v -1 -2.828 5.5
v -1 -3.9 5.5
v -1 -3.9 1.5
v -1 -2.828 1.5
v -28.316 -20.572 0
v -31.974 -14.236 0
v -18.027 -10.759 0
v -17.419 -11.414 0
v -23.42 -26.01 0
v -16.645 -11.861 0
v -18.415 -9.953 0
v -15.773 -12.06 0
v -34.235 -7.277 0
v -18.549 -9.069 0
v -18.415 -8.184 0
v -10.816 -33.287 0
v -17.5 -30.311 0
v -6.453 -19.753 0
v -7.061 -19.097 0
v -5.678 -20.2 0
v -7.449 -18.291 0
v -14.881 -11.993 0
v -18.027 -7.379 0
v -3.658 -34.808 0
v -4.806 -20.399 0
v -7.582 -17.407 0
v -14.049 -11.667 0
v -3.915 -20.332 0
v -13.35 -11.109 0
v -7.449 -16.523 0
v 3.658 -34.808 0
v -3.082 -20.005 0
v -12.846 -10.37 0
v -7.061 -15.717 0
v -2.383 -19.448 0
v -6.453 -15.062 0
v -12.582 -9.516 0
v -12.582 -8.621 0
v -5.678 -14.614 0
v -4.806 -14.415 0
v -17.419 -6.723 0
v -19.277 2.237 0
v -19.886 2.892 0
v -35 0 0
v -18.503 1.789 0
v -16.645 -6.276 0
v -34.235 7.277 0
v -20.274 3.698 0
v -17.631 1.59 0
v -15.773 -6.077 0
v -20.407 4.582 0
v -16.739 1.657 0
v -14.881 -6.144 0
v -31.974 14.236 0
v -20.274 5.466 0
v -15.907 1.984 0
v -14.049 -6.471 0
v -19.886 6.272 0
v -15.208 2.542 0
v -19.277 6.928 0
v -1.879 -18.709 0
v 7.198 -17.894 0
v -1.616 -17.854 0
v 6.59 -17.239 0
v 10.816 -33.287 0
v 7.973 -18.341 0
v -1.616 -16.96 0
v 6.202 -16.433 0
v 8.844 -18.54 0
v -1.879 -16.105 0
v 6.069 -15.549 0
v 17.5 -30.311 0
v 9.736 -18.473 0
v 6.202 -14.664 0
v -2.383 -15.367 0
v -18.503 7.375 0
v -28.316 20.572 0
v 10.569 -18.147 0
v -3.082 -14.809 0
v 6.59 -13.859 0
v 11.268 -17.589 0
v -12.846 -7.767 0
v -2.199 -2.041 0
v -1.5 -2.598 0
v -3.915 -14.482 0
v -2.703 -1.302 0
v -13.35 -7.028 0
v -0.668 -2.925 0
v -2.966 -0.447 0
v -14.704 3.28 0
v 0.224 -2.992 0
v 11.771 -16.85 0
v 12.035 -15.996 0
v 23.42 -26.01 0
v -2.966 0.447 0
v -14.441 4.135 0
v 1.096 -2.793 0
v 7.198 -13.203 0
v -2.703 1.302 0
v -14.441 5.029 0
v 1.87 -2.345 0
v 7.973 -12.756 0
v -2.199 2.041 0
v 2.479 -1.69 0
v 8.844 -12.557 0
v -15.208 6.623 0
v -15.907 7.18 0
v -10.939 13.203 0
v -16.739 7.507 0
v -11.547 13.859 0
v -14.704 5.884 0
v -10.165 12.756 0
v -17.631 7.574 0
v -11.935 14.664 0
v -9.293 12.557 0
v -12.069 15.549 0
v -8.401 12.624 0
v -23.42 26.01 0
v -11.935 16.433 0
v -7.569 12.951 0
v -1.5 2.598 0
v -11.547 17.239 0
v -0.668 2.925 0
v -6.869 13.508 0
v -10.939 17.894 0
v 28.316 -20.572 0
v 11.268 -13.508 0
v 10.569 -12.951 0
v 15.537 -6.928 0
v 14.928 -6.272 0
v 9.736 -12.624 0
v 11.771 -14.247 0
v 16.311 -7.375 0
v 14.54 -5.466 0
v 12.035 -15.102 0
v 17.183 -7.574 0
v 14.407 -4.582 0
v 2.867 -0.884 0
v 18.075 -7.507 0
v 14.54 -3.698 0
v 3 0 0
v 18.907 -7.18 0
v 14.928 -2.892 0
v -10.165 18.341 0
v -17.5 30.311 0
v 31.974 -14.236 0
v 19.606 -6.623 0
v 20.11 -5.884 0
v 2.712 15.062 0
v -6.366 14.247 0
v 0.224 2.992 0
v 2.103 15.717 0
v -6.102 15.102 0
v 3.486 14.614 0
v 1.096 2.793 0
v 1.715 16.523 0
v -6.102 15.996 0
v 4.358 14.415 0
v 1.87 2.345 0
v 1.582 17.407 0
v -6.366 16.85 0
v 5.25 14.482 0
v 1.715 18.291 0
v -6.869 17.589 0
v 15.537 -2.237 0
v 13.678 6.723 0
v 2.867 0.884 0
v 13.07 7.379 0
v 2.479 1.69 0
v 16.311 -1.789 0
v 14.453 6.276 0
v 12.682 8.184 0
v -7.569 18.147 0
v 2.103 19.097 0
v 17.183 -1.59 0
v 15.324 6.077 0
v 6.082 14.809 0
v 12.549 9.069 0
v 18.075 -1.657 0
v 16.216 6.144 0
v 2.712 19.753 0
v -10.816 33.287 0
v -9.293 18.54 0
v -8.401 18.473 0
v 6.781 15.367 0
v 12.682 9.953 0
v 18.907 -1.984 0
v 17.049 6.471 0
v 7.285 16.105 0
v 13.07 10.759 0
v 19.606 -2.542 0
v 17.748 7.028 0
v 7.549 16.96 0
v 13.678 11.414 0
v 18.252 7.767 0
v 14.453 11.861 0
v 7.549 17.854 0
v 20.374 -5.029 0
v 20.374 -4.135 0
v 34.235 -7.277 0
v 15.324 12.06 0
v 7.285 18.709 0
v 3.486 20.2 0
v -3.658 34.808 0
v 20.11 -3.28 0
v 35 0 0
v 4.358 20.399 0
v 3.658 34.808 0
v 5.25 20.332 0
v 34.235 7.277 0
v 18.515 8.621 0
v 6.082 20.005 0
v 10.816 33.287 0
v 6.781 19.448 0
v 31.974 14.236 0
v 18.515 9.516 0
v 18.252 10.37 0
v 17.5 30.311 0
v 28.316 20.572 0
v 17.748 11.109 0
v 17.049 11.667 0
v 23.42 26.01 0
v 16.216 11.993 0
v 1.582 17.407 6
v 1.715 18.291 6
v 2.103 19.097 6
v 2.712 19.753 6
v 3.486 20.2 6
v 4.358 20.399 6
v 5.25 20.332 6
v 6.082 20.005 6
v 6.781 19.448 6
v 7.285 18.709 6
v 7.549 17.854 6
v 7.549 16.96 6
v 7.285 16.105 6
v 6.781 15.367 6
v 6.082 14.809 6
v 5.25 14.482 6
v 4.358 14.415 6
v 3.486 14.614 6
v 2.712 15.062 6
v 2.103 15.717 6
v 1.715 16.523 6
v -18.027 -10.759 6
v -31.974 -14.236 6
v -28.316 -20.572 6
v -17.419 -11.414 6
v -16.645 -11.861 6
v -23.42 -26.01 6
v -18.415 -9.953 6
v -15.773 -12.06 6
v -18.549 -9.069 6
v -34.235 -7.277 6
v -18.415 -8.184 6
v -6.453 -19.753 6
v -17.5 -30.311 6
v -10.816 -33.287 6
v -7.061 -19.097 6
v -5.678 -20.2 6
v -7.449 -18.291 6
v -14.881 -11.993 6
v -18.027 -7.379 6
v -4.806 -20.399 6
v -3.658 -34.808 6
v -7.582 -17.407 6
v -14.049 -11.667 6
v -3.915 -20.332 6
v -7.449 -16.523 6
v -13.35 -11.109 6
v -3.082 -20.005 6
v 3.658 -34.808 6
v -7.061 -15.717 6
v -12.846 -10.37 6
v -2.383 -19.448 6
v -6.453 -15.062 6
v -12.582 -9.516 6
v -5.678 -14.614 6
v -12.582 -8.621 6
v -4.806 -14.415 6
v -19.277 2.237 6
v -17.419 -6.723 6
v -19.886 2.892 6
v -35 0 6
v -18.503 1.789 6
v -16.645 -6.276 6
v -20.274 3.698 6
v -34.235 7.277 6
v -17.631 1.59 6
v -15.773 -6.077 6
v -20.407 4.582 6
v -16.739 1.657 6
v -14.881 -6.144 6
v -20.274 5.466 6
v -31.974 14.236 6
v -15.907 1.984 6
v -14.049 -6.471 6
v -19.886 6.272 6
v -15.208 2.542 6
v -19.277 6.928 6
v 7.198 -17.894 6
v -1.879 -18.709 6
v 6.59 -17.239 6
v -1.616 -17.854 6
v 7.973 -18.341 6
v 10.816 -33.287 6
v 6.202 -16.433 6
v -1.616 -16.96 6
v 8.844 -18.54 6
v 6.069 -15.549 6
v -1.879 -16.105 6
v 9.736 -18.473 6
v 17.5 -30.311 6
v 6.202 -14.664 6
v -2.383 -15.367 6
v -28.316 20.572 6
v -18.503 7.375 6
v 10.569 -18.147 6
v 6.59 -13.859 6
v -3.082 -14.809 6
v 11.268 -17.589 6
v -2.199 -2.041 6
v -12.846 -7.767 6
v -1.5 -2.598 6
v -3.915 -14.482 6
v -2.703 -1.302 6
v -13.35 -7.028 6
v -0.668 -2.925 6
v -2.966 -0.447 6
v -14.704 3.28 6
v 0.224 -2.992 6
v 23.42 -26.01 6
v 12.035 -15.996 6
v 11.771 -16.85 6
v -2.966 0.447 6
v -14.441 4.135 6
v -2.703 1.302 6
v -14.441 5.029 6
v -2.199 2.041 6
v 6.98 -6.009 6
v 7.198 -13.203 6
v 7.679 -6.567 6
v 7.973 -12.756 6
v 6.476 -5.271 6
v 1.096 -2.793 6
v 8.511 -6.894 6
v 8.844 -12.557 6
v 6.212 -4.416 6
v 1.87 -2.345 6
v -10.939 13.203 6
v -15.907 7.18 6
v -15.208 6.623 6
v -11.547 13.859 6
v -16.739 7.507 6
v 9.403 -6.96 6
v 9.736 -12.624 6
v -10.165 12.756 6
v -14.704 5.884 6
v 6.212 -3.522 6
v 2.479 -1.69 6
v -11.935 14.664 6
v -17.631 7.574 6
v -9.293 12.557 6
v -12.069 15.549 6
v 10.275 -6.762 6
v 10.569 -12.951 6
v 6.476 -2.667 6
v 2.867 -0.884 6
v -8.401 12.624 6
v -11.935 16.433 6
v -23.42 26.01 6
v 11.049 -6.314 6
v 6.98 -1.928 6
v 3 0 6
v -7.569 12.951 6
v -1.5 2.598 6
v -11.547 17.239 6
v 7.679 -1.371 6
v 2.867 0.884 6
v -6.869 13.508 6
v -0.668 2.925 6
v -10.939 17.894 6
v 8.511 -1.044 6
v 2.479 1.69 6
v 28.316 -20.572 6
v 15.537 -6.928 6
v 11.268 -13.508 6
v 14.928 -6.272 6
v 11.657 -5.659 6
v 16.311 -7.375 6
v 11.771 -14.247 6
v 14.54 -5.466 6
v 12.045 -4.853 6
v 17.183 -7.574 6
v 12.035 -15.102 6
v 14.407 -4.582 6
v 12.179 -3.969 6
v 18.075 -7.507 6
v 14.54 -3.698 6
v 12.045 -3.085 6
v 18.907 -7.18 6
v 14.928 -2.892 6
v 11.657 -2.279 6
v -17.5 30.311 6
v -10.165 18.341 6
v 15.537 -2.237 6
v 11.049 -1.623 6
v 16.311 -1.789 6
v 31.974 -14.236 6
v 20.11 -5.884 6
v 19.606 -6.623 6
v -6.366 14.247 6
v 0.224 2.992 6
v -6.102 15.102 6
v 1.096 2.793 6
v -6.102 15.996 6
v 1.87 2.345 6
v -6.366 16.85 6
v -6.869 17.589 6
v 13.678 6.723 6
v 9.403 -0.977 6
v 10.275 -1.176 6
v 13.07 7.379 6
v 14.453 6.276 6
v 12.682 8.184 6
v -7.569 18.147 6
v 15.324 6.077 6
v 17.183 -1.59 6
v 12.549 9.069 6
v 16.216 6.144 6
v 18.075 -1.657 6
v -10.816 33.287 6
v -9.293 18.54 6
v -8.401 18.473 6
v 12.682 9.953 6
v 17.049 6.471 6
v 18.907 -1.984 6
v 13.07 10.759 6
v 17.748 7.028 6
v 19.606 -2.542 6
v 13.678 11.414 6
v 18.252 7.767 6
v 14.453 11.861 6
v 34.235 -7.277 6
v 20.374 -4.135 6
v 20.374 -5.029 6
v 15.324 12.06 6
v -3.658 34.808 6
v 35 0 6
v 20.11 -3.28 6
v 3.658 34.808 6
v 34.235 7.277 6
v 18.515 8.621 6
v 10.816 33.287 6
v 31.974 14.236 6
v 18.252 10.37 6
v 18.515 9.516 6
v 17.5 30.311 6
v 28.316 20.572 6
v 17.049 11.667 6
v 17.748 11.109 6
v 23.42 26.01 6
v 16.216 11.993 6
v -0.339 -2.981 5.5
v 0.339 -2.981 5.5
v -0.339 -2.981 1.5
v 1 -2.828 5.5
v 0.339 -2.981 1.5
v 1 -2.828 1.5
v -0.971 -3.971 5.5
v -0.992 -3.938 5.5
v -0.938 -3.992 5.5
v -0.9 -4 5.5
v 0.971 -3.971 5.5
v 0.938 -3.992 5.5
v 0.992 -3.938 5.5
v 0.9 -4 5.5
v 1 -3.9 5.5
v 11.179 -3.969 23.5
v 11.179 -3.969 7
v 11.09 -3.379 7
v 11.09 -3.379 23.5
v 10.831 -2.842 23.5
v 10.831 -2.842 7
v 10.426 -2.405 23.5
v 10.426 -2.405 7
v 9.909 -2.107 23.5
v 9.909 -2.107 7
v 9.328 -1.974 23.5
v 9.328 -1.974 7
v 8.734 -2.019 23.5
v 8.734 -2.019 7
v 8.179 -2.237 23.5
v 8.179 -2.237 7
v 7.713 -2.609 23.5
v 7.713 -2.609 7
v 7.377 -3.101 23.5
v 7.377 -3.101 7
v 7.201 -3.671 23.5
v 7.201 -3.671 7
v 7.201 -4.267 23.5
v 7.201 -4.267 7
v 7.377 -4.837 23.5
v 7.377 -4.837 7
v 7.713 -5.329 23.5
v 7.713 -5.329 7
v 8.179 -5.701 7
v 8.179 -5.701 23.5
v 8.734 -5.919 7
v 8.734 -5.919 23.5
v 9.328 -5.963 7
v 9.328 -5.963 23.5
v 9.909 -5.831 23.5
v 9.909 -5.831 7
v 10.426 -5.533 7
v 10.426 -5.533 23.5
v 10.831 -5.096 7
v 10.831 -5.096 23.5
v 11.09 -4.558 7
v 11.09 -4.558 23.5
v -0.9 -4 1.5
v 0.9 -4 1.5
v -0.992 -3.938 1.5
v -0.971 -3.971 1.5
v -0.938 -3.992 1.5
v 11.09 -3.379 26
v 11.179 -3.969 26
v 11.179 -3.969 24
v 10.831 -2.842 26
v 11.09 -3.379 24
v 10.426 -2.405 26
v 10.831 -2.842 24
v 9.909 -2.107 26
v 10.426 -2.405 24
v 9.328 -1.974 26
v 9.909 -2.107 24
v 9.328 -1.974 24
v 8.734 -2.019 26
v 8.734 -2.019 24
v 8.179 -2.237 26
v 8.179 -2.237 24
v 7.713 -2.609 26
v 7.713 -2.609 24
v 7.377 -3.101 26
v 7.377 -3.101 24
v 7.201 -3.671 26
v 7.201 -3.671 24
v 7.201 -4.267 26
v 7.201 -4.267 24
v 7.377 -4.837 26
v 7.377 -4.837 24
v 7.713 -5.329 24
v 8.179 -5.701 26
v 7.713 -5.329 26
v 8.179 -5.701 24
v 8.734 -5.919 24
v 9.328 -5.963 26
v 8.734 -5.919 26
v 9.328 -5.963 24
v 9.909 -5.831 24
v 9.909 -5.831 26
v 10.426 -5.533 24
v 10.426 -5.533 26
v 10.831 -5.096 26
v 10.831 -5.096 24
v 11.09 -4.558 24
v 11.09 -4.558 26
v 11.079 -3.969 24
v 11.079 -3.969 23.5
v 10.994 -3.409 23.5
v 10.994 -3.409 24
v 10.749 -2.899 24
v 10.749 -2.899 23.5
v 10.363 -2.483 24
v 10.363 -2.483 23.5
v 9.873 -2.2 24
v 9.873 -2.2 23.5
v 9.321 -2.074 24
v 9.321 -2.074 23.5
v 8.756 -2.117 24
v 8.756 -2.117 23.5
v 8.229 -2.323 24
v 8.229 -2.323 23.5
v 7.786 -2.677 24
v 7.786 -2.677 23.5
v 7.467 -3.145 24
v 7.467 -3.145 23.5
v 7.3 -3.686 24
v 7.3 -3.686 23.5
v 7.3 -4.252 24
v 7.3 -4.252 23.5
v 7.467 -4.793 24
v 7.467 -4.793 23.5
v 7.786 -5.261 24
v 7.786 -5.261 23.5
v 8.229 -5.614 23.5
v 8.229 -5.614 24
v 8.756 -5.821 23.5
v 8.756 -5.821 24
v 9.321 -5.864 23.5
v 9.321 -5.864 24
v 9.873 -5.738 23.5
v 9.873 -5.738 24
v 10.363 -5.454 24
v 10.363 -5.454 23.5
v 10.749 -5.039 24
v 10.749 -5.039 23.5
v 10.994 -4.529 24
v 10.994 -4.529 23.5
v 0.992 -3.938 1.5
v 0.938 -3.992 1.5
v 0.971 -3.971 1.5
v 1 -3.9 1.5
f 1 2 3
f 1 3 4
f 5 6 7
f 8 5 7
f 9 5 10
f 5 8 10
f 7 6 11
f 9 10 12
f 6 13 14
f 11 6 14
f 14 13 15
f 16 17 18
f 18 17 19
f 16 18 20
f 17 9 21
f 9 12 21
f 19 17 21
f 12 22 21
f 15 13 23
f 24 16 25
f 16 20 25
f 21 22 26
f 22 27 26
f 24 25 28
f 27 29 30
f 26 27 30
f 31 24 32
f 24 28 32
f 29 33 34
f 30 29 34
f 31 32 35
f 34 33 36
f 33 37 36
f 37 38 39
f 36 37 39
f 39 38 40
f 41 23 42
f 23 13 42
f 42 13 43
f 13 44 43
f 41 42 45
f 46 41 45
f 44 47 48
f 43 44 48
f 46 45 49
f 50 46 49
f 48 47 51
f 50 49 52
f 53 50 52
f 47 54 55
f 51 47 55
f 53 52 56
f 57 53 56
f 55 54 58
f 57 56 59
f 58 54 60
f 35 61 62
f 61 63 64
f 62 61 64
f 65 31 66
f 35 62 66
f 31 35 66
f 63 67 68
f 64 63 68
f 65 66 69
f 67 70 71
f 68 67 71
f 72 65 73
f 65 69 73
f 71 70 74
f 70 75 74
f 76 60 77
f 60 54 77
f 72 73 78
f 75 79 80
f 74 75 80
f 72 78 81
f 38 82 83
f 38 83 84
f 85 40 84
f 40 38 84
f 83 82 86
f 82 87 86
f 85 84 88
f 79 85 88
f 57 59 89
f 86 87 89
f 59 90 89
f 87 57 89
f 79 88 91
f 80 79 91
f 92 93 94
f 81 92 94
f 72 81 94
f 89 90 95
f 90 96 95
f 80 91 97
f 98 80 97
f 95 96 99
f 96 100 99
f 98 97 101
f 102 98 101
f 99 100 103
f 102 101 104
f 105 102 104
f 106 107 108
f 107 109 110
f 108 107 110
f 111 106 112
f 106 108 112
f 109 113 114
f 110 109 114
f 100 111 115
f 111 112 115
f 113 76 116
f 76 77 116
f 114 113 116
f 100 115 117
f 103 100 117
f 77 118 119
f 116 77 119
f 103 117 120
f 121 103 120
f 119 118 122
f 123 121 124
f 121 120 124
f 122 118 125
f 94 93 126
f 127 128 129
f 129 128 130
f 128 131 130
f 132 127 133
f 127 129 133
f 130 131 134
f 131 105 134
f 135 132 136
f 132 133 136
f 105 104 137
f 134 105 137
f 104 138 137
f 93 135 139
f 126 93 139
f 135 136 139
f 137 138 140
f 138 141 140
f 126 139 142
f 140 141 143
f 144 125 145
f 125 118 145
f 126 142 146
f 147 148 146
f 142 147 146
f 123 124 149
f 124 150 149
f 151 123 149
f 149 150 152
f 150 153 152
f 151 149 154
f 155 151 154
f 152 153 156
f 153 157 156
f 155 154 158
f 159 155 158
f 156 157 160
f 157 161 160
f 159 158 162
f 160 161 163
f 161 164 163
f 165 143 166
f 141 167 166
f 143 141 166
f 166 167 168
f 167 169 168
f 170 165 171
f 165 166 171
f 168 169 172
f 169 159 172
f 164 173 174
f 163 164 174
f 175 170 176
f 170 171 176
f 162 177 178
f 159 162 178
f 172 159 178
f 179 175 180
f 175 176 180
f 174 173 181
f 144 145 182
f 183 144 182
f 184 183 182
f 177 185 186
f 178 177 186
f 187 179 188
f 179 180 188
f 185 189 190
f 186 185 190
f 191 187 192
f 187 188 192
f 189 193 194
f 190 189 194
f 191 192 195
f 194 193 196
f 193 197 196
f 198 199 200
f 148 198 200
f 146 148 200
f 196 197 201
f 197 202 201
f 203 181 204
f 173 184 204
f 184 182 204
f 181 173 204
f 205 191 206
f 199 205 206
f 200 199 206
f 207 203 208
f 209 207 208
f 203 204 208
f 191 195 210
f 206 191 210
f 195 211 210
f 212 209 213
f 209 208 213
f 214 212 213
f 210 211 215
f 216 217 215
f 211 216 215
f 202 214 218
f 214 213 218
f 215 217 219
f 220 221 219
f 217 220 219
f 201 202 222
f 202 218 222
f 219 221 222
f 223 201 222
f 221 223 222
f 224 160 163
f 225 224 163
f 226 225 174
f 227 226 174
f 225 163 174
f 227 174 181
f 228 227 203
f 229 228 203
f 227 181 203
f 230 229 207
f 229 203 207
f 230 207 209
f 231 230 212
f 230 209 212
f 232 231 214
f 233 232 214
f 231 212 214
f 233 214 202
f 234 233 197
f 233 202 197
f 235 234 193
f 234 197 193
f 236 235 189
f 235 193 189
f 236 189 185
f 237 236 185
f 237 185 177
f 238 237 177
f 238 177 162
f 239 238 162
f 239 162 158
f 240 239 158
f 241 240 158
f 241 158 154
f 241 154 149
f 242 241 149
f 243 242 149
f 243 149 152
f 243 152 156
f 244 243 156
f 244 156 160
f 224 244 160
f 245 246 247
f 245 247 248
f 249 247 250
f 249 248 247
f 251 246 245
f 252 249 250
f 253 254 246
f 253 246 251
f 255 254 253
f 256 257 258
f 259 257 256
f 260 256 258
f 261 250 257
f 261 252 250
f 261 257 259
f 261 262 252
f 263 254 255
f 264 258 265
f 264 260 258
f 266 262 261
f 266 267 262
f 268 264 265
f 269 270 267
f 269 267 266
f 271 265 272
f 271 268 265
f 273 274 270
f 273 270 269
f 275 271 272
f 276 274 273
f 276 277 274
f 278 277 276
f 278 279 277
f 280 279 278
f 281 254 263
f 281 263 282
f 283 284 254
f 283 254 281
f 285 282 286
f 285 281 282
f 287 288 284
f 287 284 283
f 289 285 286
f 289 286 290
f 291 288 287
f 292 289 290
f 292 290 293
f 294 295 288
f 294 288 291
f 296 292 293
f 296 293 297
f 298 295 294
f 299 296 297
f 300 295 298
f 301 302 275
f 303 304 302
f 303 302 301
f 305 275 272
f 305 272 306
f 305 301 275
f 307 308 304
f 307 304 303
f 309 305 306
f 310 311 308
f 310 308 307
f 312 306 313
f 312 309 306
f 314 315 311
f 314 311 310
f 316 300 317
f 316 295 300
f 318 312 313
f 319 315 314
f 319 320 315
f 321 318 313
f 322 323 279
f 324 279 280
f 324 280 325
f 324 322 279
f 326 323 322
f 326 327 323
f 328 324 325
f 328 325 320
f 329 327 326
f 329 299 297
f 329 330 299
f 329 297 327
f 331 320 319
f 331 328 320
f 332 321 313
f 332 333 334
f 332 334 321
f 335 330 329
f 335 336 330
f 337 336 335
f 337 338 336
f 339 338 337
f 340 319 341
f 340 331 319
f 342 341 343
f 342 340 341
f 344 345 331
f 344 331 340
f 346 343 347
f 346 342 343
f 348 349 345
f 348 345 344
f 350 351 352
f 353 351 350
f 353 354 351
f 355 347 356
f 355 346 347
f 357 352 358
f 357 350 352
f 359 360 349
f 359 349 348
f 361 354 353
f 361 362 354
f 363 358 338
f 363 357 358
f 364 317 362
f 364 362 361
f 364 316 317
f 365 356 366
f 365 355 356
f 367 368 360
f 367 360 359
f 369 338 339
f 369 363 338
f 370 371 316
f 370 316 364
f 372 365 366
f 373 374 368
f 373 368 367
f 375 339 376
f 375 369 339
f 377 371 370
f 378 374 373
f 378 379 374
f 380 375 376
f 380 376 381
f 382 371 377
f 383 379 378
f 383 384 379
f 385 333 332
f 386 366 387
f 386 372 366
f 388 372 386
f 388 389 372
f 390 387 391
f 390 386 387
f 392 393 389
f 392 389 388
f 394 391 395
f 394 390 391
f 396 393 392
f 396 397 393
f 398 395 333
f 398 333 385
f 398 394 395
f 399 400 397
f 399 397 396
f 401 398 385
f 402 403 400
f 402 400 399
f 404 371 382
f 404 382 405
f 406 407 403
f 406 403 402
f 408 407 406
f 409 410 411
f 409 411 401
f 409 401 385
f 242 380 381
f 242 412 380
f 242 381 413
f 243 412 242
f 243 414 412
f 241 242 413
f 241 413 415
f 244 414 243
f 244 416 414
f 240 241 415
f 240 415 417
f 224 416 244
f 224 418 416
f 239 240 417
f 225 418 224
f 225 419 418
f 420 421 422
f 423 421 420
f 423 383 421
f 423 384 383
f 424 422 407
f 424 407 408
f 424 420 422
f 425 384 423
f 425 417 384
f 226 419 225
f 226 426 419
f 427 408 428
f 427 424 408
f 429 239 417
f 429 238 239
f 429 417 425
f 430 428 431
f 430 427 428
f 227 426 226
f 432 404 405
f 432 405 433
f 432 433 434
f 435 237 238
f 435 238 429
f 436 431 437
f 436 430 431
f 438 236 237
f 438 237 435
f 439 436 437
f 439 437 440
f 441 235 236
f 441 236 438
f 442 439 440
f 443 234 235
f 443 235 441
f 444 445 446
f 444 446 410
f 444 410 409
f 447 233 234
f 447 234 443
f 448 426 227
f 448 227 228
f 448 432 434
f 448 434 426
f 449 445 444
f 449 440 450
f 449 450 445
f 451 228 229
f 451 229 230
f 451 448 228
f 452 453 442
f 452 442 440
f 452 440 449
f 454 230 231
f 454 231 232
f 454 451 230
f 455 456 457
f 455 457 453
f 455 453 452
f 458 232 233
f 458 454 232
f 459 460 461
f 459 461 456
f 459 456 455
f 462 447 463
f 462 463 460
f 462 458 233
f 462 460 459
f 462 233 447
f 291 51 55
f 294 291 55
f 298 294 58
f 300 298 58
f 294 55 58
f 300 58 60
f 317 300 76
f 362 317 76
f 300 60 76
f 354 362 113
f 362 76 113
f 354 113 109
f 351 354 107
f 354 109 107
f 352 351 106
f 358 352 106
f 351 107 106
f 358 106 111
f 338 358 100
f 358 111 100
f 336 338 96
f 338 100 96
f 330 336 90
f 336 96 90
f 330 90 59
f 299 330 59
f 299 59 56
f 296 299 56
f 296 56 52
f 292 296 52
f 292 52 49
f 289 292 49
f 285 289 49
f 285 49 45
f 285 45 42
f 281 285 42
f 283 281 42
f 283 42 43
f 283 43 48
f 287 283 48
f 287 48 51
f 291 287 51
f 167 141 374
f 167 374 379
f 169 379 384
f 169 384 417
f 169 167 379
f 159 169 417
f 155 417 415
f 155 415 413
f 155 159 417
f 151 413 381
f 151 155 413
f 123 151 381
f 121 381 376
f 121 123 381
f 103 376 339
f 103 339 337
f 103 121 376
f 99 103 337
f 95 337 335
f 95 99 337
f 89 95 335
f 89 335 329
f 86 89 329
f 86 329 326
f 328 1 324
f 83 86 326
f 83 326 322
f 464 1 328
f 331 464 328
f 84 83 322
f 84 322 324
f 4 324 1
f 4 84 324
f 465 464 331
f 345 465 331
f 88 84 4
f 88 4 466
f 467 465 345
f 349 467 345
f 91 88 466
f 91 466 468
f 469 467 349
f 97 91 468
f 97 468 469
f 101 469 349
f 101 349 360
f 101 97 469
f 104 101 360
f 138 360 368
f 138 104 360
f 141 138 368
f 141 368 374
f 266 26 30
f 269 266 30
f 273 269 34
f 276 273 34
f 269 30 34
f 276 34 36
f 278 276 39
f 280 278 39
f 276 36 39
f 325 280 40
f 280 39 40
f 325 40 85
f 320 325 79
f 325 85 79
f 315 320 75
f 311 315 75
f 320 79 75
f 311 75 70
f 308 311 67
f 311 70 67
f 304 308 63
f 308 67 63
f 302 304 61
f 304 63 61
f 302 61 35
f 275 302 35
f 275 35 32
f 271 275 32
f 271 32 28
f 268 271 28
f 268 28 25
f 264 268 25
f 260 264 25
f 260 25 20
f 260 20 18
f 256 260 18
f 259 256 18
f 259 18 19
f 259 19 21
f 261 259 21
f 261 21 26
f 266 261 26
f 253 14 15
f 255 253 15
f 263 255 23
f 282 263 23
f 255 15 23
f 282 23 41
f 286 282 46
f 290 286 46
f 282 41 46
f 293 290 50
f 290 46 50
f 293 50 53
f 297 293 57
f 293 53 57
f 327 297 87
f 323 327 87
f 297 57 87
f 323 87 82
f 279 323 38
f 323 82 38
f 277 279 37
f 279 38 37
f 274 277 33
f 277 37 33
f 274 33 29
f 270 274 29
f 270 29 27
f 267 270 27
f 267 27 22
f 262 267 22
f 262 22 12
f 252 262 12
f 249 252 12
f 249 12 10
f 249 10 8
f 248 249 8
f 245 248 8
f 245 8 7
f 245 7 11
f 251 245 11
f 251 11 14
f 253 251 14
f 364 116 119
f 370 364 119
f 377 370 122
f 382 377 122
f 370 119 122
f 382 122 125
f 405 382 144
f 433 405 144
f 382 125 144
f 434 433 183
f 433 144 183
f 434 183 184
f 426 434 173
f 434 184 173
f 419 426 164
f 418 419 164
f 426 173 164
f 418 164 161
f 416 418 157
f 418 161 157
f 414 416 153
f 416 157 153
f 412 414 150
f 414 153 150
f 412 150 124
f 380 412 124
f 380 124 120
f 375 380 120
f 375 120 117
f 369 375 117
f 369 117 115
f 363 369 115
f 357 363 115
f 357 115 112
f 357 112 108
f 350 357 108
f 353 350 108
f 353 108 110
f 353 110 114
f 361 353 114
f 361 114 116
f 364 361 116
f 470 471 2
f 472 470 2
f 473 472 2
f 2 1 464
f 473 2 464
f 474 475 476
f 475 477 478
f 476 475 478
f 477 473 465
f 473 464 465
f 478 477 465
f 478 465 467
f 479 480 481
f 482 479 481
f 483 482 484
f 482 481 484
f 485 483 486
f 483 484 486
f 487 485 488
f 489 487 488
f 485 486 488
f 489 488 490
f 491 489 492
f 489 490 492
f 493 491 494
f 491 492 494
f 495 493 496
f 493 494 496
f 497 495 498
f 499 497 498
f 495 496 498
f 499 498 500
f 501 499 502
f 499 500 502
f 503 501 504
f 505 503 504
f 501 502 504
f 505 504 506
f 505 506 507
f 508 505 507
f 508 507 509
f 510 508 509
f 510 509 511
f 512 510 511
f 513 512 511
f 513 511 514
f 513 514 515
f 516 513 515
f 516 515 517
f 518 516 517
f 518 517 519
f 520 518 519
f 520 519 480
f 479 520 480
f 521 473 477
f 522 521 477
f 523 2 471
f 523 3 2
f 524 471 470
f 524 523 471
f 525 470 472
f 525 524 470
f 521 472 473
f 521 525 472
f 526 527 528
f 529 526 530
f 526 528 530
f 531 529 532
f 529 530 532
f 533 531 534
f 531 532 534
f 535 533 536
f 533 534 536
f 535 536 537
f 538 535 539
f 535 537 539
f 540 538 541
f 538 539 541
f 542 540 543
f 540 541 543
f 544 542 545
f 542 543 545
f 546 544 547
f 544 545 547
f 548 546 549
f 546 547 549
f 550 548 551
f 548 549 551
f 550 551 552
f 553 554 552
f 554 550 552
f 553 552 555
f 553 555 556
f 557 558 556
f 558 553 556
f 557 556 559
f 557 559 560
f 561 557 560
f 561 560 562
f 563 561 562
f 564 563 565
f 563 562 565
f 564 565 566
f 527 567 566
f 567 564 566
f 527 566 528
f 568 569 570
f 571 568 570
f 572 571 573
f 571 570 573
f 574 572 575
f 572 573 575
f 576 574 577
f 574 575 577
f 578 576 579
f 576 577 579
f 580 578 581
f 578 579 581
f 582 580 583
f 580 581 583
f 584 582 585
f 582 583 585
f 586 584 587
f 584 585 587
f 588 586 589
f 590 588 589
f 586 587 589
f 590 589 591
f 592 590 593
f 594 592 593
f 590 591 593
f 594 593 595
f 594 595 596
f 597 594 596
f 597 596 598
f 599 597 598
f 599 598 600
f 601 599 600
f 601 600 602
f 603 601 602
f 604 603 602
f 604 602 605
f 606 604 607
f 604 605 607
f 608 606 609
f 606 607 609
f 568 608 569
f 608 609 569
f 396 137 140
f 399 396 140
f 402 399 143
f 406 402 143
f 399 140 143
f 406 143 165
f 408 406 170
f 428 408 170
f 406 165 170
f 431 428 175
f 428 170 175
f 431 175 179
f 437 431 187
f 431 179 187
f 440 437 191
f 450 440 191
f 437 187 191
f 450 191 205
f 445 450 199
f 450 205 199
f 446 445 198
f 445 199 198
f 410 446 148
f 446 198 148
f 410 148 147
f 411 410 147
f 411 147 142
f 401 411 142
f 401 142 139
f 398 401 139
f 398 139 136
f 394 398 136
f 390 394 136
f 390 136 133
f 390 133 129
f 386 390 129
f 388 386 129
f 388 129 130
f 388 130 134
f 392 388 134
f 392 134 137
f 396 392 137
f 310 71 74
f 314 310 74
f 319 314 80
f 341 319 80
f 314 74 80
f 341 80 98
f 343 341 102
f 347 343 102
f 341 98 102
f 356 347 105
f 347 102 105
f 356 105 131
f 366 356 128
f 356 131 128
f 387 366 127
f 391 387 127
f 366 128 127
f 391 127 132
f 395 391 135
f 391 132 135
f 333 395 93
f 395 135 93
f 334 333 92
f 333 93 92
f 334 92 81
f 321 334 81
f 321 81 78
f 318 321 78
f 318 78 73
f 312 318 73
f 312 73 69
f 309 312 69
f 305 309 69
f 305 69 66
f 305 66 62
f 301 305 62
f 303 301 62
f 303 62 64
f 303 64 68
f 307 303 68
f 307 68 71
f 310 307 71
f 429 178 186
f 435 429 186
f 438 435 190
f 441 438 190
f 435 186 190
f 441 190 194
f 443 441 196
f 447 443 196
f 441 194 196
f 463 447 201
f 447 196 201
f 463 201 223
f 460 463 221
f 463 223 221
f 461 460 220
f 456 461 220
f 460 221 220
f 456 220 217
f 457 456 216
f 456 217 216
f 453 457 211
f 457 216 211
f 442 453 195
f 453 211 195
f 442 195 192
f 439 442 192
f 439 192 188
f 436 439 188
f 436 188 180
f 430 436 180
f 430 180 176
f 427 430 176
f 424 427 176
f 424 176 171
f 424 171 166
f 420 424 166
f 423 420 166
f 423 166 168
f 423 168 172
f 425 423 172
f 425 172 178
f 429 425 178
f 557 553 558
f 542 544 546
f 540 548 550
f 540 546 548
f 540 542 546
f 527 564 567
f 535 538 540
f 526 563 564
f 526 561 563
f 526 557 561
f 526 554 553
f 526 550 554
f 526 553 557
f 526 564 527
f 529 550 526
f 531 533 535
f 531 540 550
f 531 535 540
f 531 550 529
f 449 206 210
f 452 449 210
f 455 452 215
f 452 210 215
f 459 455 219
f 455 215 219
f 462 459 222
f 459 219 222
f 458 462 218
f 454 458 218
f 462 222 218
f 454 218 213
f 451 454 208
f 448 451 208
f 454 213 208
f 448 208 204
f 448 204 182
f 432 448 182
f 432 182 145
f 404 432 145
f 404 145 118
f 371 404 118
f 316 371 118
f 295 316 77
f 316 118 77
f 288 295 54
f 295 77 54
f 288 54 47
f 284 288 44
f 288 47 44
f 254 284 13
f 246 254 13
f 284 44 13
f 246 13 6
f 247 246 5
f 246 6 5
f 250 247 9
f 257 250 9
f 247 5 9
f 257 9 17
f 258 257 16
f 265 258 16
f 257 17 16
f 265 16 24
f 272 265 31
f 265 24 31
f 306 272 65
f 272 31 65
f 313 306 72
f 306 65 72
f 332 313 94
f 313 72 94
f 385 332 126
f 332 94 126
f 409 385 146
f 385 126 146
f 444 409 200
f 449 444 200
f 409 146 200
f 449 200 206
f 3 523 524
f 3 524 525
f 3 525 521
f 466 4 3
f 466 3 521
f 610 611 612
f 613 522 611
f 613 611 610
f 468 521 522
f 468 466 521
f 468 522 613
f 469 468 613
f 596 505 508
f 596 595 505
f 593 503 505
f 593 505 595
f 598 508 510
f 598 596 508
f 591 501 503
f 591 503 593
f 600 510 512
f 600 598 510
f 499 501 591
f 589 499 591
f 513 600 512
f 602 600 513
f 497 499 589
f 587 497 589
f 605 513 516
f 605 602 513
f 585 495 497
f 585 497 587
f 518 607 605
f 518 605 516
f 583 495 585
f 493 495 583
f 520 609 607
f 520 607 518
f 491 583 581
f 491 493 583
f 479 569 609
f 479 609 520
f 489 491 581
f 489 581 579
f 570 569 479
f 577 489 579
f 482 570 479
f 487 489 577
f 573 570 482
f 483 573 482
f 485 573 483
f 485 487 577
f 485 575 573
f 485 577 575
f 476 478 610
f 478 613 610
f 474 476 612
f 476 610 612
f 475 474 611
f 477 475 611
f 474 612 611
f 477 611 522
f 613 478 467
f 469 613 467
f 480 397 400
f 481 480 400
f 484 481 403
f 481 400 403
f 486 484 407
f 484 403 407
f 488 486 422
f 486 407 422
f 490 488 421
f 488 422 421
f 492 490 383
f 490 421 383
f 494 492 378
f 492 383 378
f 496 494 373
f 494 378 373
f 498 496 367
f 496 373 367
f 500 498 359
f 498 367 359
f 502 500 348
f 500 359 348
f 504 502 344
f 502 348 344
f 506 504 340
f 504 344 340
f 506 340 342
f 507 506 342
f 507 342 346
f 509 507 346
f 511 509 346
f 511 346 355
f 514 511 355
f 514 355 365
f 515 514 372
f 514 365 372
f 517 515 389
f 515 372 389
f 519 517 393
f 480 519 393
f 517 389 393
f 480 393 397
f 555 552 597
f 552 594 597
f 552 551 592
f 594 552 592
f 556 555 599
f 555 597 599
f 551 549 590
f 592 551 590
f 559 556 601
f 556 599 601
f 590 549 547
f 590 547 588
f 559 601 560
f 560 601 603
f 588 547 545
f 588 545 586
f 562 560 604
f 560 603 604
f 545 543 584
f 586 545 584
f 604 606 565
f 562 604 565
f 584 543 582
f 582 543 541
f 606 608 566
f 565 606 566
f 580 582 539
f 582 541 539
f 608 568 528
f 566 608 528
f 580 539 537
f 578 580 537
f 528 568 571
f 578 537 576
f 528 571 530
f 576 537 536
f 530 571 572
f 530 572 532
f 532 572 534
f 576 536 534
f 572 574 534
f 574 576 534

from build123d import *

# Parameters (mm, degrees)
SKETCH_1_R          = 35
SKETCH_1_R_2        = 3
EXTRUDE_1_DEPTH     = 6
SKETCH_3_R          = 3
CUT_EXTRUDE_2_DEPTH = 50.859803449
SKETCH_4_R          = 2
EXTRUDE_2_DEPTH     = 22
SKETCH_7_R          = 4
EXTRUDE_3_DEPTH     = 2
CHAMFER_1_SIZE      = 1
CUT_EXTRUDE_START   = -0.5
SKETCH_9_W          = 2
SKETCH_9_H          = 2
CUT_EXTRUDE_5_DEPTH = 4
FILLET_1_R          = 0.1
SKETCH_12_R         = 4
CUT_EXTRUDE_6_DEPTH = 2
CUT_EXTRUDE_START_2 = -2.5
SKETCH_13_R         = 2
SKETCH_13_R_2       = 1.9
CUT_EXTRUDE_7_DEPTH = 0.5


with BuildPart() as part:
    # 草图1 → 凸台-拉伸1 (new body)
    with BuildSketch(Plane.XY):
        Circle(SKETCH_1_R)
        Circle(SKETCH_1_R_2, mode=Mode.SUBTRACT)
    extrude(amount=EXTRUDE_1_DEPTH)

    # 草图3 → 切除-拉伸2 (cut, through all)
    with BuildSketch(Plane(origin=(0, 0, 0), x_dir=(-1, 0, 0), z_dir=(0, 0, -1))):
        with Locations((-4.582105158, 17.407019053)):
            Circle(SKETCH_3_R)
        with Locations((9.068583583, 15.548658842)):
            Circle(SKETCH_3_R)
        with Locations((17.407019053, 4.582105158)):
            Circle(SKETCH_3_R)
        with Locations((15.548658842, -9.068583583)):
            Circle(SKETCH_3_R)
        with Locations((4.582105158, -17.407019053)):
            Circle(SKETCH_3_R)
        with Locations((-9.068583583, -15.548658842)):
            Circle(SKETCH_3_R)
        with Locations((-17.407019053, -4.582105158)):
            Circle(SKETCH_3_R)
        with Locations((-15.548658842, 9.068583583)):
            Circle(SKETCH_3_R)
    extrude(amount=-CUT_EXTRUDE_2_DEPTH, mode=Mode.SUBTRACT)

    # 草图4 → 凸台-拉伸2 (add)
    with BuildSketch(Plane.XY.offset(6)):
        with Locations((9.178670771, -3.968879298)):
            Circle(SKETCH_4_R)
    extrude(amount=EXTRUDE_2_DEPTH)

    # 草图7 → 凸台-拉伸3 (add)
    with BuildSketch(Plane.XY.offset(28)):
        with Locations((9.178670771, -3.968879298)):
            Circle(SKETCH_7_R)
    extrude(amount=-EXTRUDE_3_DEPTH)

    # 倒角1
    chamfer_1_edges = [part.edges().sort_by_distance(p)[0] for p in [
        (7.178670771, -3.968879298, 6),
    ]]
    chamfer(chamfer_1_edges, length=CHAMFER_1_SIZE)

    # 草图9 → 切除-拉伸5 (cut)
    with BuildSketch(Plane.XY.offset(6).offset(CUT_EXTRUDE_START)):
        with Locations((0, -3)):
            Rectangle(SKETCH_9_W, SKETCH_9_H)
    extrude(amount=-CUT_EXTRUDE_5_DEPTH, mode=Mode.SUBTRACT)

    # 圆角1
    fillet_1_edges = [part.edges().sort_by_distance(p)[0] for p in [
        (1, -4, 3.5),
        (-1, -4, 3.5),
    ]]
    fillet(fillet_1_edges, radius=FILLET_1_R)

    # 草图12 → 切除-拉伸6 (cut)
    with BuildSketch(Plane.XY.offset(28)):
        with Locations((9.178670771, -3.968879298)):
            Circle(SKETCH_12_R)
    extrude(amount=-CUT_EXTRUDE_6_DEPTH, mode=Mode.SUBTRACT)

    # 草图13 → 切除-拉伸7 (cut)
    with BuildSketch(Plane.XY.offset(26).offset(CUT_EXTRUDE_START_2)):
        with Locations((9.178670771, -3.968879298)):
            Circle(SKETCH_13_R)
        with Locations((9.178670771, -3.968879298)):
            Circle(SKETCH_13_R_2, mode=Mode.SUBTRACT)
    extrude(amount=CUT_EXTRUDE_7_DEPTH, mode=Mode.SUBTRACT)


solid = part.part
